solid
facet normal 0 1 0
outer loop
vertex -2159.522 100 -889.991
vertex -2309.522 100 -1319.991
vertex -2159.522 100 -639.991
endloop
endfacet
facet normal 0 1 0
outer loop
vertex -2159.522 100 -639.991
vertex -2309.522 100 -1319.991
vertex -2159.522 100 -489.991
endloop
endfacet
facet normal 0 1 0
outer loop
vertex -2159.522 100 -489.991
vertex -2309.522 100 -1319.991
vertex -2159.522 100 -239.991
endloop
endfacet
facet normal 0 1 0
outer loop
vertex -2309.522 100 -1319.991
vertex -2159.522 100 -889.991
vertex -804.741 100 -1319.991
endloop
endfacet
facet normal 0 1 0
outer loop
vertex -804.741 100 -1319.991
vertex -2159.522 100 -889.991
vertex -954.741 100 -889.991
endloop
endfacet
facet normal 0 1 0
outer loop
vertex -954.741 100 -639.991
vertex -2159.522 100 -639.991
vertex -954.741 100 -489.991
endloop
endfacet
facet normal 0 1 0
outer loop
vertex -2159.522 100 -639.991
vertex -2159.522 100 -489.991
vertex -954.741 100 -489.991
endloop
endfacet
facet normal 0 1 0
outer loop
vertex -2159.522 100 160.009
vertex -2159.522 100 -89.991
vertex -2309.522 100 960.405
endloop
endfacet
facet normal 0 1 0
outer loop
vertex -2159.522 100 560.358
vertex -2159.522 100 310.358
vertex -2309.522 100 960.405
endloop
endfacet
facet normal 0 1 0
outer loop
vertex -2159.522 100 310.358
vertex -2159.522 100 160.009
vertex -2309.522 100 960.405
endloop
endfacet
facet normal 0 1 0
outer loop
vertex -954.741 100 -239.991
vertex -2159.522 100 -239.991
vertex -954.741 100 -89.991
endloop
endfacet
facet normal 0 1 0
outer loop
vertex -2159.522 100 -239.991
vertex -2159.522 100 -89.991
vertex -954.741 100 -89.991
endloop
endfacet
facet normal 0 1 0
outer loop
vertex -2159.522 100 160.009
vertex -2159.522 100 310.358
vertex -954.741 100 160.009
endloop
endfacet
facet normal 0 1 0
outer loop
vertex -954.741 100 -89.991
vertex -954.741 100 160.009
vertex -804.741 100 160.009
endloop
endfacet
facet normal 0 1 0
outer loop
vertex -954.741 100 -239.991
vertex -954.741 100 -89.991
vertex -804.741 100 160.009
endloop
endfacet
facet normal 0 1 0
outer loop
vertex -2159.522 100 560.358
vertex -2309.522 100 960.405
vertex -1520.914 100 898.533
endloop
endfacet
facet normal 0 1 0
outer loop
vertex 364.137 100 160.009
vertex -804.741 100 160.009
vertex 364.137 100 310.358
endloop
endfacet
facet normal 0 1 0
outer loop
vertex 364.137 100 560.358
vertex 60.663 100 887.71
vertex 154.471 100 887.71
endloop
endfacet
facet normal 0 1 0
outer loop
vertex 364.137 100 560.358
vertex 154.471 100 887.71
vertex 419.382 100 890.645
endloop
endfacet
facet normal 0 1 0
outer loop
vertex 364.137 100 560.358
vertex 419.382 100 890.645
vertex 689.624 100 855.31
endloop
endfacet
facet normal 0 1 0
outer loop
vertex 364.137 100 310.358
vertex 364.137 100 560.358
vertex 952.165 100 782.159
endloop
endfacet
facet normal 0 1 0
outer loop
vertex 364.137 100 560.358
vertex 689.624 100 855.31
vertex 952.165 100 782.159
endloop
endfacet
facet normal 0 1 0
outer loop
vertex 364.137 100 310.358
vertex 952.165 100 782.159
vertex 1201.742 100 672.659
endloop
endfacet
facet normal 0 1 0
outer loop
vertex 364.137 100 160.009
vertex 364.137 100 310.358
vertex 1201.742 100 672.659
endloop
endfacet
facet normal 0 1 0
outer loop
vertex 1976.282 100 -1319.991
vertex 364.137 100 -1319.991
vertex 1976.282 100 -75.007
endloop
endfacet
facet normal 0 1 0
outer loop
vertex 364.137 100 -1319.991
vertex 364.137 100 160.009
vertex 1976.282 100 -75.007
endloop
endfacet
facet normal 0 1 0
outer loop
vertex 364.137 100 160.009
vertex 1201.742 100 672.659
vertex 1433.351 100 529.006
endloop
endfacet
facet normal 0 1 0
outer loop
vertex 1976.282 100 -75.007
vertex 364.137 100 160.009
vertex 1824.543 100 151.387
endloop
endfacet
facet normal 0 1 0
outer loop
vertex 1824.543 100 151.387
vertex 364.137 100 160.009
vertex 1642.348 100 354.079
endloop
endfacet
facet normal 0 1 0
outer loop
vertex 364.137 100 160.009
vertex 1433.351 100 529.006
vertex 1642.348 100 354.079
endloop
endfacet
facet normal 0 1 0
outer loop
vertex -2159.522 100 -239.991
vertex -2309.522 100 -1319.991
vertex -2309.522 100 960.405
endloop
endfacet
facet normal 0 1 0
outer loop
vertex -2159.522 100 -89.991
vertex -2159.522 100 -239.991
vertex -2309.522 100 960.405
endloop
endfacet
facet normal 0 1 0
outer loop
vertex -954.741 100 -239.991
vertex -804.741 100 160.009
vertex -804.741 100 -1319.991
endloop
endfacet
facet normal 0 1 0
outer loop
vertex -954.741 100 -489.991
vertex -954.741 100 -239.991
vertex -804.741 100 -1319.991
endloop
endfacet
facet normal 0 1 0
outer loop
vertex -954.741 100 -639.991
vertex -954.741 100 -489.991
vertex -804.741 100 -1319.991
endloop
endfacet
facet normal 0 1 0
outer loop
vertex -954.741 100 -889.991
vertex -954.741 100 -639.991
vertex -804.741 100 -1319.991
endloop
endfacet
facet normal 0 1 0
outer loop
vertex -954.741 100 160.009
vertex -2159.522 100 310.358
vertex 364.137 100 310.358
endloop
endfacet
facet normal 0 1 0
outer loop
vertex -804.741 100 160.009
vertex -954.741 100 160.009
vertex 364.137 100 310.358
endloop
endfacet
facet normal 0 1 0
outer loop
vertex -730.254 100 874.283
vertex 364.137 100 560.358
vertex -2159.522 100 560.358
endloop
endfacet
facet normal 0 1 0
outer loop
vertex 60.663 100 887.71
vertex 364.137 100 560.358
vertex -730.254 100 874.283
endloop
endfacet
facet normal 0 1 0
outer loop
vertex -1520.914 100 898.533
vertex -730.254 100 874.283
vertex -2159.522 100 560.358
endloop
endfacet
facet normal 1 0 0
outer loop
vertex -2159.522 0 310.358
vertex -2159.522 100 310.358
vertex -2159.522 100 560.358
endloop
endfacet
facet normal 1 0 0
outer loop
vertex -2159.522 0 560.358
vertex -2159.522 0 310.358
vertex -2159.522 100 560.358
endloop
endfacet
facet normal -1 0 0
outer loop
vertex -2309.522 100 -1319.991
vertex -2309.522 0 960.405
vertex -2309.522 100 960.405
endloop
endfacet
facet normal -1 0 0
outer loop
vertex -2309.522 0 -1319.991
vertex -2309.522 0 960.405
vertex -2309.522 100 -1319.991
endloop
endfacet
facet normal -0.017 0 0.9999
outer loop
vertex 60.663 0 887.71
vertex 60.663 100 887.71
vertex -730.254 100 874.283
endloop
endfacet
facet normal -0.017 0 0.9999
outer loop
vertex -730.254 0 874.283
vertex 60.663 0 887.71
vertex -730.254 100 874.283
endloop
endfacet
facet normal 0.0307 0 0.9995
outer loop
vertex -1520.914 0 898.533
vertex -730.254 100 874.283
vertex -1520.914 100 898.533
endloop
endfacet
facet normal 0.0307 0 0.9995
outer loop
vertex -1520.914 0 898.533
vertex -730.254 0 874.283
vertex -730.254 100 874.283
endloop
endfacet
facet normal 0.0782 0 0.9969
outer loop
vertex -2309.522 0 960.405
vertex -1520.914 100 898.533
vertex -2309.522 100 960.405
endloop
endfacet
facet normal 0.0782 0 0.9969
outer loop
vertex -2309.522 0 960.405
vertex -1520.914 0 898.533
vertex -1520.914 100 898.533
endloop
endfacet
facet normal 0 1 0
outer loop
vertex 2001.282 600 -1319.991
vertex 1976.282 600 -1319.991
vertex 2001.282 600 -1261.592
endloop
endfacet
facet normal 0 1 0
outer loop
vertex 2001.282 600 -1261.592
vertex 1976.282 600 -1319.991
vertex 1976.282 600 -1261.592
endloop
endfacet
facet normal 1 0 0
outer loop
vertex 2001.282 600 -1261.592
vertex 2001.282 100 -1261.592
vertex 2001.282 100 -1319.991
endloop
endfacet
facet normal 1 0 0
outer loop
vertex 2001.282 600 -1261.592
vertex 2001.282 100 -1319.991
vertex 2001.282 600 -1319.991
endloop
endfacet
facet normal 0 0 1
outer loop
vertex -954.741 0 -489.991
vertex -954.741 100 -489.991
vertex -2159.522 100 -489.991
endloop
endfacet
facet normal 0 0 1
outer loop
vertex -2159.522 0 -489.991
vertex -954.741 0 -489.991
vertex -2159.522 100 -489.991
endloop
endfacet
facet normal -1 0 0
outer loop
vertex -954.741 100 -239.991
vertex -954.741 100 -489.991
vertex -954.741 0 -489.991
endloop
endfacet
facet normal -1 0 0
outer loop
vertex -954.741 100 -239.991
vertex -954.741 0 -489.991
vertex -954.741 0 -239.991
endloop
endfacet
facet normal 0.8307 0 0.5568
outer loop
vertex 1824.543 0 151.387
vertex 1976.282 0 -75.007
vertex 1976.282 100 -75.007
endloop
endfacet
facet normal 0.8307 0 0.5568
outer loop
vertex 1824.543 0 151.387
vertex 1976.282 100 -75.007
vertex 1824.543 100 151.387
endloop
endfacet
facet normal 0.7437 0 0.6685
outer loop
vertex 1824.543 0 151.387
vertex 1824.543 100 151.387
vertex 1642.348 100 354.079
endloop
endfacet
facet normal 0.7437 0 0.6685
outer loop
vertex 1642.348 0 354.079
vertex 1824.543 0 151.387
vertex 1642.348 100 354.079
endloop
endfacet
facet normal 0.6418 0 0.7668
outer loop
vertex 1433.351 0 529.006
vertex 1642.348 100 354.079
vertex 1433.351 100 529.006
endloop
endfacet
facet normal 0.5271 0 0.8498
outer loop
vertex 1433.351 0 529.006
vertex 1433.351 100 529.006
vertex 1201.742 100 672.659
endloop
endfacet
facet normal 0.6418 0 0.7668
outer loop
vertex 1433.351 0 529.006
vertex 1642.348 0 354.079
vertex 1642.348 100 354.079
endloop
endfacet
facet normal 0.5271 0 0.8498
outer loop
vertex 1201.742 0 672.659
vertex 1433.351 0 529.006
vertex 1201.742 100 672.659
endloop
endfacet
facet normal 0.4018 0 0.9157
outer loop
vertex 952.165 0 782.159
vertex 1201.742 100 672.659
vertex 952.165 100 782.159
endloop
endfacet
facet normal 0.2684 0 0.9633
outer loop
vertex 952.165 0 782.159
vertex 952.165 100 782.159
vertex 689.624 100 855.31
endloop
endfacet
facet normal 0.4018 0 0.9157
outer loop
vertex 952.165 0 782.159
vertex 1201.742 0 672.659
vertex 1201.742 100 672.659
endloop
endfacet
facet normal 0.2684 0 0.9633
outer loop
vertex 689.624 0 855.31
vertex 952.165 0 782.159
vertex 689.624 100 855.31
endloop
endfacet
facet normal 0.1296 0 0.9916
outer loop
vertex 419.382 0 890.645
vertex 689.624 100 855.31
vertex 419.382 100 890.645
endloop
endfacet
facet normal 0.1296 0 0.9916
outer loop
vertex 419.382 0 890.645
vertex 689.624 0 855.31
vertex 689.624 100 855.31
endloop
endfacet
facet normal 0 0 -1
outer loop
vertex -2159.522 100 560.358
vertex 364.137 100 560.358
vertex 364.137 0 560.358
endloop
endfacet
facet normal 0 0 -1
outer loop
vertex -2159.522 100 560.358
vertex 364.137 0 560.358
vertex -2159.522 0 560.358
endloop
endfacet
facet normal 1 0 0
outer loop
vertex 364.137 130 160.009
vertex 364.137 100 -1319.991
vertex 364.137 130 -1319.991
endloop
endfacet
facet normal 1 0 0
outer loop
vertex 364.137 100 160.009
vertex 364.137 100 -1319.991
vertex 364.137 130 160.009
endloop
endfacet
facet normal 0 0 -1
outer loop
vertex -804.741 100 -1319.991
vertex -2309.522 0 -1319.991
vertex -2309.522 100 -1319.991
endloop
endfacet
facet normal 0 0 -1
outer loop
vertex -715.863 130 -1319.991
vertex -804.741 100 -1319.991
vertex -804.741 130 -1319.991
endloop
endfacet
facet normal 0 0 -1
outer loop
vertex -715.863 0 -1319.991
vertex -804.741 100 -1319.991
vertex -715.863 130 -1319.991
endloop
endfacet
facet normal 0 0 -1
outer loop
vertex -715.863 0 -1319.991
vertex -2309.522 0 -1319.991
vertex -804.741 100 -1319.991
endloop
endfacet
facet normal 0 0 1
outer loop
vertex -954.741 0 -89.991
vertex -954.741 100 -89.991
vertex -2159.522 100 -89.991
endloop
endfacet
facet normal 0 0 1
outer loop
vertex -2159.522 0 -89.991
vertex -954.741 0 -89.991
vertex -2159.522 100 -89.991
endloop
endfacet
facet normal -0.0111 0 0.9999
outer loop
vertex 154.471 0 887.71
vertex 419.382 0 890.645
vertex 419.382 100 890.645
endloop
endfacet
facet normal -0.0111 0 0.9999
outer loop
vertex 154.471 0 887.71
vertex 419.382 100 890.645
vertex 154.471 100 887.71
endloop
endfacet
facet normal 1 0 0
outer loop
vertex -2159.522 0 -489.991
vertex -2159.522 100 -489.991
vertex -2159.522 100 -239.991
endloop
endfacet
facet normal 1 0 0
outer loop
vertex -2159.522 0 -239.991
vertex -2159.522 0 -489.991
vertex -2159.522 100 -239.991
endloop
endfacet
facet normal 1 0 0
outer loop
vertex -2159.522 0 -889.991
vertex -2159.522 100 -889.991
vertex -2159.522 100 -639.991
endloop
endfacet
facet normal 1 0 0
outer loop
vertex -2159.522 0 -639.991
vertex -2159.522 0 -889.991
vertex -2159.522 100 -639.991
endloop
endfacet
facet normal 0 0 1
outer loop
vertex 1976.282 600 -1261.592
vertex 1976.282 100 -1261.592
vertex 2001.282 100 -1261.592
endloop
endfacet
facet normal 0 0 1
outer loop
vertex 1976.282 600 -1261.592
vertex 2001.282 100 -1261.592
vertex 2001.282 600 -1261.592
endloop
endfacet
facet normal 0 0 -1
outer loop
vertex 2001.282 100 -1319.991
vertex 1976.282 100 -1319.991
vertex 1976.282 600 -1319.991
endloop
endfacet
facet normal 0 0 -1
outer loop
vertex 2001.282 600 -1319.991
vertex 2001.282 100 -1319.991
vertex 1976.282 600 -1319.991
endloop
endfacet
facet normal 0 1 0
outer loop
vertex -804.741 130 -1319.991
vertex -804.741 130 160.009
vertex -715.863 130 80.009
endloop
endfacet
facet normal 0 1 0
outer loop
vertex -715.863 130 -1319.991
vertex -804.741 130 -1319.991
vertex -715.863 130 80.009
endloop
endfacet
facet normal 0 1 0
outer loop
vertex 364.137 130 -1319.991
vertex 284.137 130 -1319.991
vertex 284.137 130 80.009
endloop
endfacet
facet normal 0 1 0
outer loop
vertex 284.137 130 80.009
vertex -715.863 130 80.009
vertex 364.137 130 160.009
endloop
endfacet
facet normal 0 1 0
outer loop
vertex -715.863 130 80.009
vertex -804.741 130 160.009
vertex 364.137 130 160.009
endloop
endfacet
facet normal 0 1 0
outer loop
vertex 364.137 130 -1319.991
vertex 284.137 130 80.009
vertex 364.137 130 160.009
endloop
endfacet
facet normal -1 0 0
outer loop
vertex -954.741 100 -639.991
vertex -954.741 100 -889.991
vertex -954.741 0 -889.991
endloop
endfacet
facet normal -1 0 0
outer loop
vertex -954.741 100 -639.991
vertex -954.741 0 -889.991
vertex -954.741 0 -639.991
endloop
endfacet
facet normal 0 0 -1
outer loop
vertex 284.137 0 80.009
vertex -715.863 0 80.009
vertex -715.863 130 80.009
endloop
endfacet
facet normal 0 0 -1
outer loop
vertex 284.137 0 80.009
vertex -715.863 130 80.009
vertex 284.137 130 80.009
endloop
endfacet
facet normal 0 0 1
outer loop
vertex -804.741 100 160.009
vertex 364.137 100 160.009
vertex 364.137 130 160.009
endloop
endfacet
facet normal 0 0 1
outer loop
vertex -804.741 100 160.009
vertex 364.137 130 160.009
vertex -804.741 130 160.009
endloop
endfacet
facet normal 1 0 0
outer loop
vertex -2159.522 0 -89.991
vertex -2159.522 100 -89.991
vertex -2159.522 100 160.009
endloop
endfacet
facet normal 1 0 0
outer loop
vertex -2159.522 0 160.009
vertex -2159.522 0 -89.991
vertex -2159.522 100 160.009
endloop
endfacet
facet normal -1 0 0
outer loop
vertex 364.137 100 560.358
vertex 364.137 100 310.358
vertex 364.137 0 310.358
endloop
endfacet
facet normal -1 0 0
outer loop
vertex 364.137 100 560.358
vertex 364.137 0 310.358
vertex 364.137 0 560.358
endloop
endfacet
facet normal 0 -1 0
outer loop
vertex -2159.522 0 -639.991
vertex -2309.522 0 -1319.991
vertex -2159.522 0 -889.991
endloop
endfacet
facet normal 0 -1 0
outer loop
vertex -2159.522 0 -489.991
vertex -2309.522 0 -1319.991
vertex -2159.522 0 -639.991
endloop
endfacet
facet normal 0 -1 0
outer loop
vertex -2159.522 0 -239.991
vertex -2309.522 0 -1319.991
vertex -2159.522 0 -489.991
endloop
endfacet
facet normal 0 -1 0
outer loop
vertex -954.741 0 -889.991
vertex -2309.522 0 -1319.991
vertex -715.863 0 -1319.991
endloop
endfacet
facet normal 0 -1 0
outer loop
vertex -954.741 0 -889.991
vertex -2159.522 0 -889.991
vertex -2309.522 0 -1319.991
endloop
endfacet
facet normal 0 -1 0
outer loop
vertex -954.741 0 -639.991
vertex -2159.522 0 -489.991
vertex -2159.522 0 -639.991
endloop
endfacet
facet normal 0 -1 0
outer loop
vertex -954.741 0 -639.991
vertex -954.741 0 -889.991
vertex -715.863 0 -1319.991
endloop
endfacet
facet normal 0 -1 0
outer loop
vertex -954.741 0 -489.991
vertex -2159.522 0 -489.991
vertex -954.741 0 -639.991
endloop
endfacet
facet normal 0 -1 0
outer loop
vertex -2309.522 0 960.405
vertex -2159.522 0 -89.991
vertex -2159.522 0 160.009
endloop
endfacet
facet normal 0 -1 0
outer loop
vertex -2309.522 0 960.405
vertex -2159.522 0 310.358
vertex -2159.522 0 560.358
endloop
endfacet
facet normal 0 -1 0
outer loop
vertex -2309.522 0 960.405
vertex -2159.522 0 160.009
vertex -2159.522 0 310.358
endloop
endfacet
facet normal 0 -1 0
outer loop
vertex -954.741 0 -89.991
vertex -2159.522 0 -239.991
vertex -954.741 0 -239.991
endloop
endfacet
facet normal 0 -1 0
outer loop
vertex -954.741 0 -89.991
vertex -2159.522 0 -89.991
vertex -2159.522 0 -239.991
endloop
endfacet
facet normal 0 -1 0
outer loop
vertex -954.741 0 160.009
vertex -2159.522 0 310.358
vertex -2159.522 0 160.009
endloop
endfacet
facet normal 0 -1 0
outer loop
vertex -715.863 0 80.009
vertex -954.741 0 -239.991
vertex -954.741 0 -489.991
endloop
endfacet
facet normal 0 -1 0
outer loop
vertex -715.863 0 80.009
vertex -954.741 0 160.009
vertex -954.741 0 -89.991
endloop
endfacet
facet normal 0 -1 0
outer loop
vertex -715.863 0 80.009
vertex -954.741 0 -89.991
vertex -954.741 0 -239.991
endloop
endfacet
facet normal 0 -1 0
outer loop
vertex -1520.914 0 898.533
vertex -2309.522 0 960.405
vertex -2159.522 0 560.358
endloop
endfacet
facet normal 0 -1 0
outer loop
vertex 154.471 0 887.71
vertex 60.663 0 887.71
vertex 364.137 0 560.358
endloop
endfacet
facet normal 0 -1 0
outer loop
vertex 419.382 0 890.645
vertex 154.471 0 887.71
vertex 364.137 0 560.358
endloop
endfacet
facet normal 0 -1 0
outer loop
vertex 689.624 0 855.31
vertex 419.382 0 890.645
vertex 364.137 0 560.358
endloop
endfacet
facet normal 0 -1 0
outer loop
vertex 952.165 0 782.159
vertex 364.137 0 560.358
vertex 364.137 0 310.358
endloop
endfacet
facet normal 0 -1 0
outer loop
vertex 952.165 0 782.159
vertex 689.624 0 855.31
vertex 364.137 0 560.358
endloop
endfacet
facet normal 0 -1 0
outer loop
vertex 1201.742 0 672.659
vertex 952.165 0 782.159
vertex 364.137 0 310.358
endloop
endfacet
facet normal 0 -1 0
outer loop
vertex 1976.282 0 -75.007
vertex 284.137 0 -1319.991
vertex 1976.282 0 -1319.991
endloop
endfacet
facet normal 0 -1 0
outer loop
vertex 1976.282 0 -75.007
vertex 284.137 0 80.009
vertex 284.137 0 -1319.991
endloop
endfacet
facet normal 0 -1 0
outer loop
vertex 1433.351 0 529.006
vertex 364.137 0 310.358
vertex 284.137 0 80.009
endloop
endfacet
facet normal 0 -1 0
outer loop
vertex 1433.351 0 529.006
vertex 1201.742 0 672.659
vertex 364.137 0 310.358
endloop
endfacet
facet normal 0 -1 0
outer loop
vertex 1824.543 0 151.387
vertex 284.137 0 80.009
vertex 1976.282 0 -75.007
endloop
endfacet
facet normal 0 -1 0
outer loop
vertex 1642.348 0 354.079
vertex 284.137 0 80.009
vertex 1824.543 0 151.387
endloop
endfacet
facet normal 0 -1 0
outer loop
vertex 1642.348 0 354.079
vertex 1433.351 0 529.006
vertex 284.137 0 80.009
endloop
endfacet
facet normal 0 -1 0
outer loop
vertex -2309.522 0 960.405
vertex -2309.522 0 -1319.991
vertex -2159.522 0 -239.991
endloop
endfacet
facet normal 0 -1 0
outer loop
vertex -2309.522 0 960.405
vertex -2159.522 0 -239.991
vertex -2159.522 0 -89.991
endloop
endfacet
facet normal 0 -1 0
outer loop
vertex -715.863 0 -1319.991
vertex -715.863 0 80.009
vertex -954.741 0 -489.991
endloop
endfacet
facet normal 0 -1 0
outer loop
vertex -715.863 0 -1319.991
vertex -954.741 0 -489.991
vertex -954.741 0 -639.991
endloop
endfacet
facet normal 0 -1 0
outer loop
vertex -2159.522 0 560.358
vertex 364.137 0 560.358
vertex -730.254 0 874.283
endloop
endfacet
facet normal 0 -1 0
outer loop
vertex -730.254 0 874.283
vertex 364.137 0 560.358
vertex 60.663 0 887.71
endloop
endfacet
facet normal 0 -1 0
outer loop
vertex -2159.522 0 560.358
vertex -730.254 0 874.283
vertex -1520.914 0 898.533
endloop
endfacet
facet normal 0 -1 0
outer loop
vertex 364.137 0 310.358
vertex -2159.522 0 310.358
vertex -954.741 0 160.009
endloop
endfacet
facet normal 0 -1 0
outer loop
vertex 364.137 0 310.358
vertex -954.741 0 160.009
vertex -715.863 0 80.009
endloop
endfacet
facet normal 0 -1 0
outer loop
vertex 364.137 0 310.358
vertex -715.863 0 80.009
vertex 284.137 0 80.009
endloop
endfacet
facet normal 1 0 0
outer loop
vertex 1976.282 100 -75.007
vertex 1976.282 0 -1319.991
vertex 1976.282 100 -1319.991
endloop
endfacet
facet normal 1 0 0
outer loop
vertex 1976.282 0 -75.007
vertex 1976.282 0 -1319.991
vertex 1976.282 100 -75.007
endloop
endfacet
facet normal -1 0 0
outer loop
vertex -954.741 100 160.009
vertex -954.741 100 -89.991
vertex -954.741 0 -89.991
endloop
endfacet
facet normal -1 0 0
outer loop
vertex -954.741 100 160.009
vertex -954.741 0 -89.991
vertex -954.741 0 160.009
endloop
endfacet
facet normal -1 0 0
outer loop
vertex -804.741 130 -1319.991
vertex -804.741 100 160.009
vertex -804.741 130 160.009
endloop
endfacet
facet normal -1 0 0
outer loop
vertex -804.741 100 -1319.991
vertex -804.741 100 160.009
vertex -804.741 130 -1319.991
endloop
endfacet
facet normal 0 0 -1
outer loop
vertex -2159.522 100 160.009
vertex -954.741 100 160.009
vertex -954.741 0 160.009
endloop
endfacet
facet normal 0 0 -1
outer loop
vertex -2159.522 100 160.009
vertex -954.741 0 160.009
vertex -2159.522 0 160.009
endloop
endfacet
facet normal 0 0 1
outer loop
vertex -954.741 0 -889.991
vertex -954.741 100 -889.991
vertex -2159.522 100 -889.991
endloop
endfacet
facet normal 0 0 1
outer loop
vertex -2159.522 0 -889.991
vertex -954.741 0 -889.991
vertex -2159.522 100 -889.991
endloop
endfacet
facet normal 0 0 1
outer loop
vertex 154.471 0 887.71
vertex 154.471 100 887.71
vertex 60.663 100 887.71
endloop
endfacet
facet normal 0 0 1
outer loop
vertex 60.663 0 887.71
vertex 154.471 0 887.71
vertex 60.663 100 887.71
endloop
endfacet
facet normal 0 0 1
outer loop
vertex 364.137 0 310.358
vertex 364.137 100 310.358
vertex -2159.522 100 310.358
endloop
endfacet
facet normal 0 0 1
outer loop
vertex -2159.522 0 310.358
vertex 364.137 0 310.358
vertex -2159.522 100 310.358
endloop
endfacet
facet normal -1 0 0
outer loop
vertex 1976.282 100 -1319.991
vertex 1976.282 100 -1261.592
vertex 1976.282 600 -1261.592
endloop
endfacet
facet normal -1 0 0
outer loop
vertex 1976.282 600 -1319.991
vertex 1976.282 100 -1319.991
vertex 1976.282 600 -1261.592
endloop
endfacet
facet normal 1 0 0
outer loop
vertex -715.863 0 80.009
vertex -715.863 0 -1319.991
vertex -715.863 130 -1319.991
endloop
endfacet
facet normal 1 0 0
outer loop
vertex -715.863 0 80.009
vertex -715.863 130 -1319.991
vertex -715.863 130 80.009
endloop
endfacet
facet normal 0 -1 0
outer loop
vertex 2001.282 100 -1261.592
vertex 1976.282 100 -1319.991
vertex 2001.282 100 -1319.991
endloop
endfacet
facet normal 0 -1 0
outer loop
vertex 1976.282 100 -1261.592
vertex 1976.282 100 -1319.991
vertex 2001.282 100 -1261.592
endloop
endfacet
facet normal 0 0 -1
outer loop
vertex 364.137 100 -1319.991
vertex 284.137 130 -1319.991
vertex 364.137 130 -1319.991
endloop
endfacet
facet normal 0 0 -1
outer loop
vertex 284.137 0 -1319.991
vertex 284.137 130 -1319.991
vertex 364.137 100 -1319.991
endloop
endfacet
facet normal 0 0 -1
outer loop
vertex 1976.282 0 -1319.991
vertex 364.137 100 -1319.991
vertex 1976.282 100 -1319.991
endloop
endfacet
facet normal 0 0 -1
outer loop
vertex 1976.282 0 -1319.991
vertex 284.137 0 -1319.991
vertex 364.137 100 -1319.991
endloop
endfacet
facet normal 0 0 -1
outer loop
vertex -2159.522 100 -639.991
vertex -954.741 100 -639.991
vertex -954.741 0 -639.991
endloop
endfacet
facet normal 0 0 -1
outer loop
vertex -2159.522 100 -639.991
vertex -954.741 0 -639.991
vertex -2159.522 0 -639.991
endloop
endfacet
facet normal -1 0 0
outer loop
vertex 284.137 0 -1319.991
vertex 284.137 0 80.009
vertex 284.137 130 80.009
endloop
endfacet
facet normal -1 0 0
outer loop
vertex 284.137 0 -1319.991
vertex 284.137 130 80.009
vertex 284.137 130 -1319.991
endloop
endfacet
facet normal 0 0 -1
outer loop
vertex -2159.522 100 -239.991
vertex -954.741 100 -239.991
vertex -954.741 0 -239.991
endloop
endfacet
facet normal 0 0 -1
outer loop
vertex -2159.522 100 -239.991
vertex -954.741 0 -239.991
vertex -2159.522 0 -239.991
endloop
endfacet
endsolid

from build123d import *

# Parameters (mm, degrees)
F1_DEPTH = 100
F2_DEPTH = 130
F3_W     = 500
F3_H     = 58.3985337053
F4_DEPTH = 25
F5_DEPTH = 100
F6_W     = 2523.6582771599
F6_H     = 250
F6_W_2   = 1204.7804204285
F7_DEPTH = 2010


with BuildPart() as f1:
    # F0 (on Front) → F1 (new body)
    with BuildSketch(Plane.XZ):
        with BuildLine():
            Line((1976.281786722, -1319.9909218584), (1976.281786722, -75.0071237824))
            ThreePointArc((1976.281786722, -75.0071237824), (1320.0925674661, 604.9370809418), (419.3822159536, 890.645456185))
            Line((419.3822159536, 890.645456185), (154.4708479568, 887.7100799802))
            Line((154.4708479568, 887.7100799802), (60.6627279326, 887.7100799802))
            ThreePointArc((60.6627279326, 887.7100799802), (-1175.980197838, 883.3175253267), (-2409.5215050042, 970.9580633765))
            Line((-2409.5215050042, 970.9580633765), (-2409.5215050042, -1319.9909218584))
            Line((-2409.5215050042, -1319.9909218584), (-804.7410845757, -1319.9909218584))
            Line((-804.7410845757, -1319.9909218584), (-804.7410845757, 160.0090781416))
            Line((-804.7410845757, 160.0090781416), (-715.8632278442, 160.0090781416))
            Line((-715.8632278442, 160.0090781416), (284.1367721558, 160.0090781416))
            Line((284.1367721558, 160.0090781416), (364.1367721558, 160.0090781416))
            Line((364.1367721558, 160.0090781416), (364.1367721558, -1319.9909218584))
            Line((364.1367721558, -1319.9909218584), (1976.281786722, -1319.9909218584))
        make_face()
    extrude(amount=-F1_DEPTH)

    # F0 (on Front) → F2 (join)
    with BuildSketch(Plane.XZ):
        Polygon((284.1367721558, -1319.9909218584), (364.1367721558, -1319.9909218584), (364.1367721558, 160.0090781416), (284.1367721558, 160.0090781416), (-715.8632278442, 160.0090781416), (-804.7410845757, 160.0090781416), (-804.7410845757, -1319.9909218584), (-715.8632278442, -1319.9909218584), (-715.8632278442, 80.0090781416), (-225.8632278442, 80.0090781416), (-215.8632278442, 80.0090781416), (-205.8632278442, 80.0090781416), (284.1367721558, 80.0090781416), align=None)
    extrude(amount=-F2_DEPTH)

    # F5 (cut): a face of the model
    f5_faces = [f1.faces().sort_by_distance(p)[0] for p in [
        (-2409.5215050042, 50, -174.5164292409),
    ]]
    extrude(f5_faces, amount=-F5_DEPTH, mode=Mode.SUBTRACT)

    # F6 (on face) → F7 (cut)
    with BuildSketch(Plane(origin=(0, 100, 0), x_dir=(-1, 0, 0), z_dir=(0, 1, 0))):
        with Locations((897.6923664242, 435.3581443429)):
            Rectangle(F6_W, F6_H)
        with Locations((1557.1312947899, 35.0090781416)):
            Rectangle(F6_W_2, F6_H)
        with Locations((1557.1312947899, -364.9909218584)):
            Rectangle(F6_W_2, F6_H)
        with Locations((1557.1312947899, -764.9909218584)):
            Rectangle(F6_W_2, F6_H)
    extrude(amount=-F7_DEPTH, mode=Mode.SUBTRACT)


with BuildPart() as f4:
    # F3 (on face) → F4 (new body)
    with BuildSketch(Plane.YZ.offset(1976.281786722)):
        with Locations((350, -1290.7916550057)):
            Rectangle(F3_W, F3_H)
    extrude(amount=F4_DEPTH)


solid = Compound([f1.part, f4.part])
